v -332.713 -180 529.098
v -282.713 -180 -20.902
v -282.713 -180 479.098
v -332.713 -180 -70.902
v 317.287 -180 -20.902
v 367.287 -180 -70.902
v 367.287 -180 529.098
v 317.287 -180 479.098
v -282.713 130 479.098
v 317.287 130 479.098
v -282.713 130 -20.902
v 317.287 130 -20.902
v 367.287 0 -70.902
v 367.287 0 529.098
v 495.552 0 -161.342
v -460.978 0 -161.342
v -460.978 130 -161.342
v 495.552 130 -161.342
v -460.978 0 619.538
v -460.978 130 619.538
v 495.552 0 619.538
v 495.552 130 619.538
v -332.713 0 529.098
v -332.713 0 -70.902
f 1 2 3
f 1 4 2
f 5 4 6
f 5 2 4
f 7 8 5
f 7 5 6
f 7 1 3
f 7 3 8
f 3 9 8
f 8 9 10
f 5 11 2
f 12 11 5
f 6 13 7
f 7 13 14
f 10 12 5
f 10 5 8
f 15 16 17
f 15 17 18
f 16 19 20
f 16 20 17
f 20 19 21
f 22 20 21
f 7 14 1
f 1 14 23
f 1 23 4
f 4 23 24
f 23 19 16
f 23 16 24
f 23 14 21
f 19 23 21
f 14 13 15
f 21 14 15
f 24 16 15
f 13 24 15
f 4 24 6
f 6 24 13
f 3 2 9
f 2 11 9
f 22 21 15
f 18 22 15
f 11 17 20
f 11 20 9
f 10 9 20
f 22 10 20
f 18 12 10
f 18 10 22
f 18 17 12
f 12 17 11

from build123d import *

# Parameters (mm, degrees)
SKETCH1_W           = 956.53
SKETCH1_H           = 780.88
BOSS_EXTRUDE1_DEPTH = 130
SKETCH2_W           = 600
SKETCH2_H           = 500
BOSS_EXTRUDE2_DEPTH = 180


with BuildPart() as part:
    # Sketch1 → Boss-Extrude1 (new body)
    with BuildSketch(Plane(origin=(0, 0, 0), x_dir=(1, 0, 0), z_dir=(0, 1, 0))):
        with Locations((17.286686747, -229.097590361)):
            Rectangle(SKETCH1_W, SKETCH1_H)
        Polygon((17.286686747, 20.902409639), (317.286686747, 20.902409639), (317.286686747, -229.097590361), (317.286686747, -479.097590361), (17.286686747, -479.097590361), (-282.713313253, -479.097590361), (-282.713313253, -229.097590361), (-282.713313253, 20.902409639), align=None, mode=Mode.SUBTRACT)
    extrude(amount=BOSS_EXTRUDE1_DEPTH)

    # Sketch2 → Boss-Extrude2 (add)
    with BuildSketch(Plane.XZ):
        Polygon((367.286686747, -70.902409639), (367.286686747, -20.902409639), (367.286686747, 479.097590361), (367.286686747, 529.097590361), (-332.713313253, 529.097590361), (-332.713313253, 479.097590361), (-332.713313253, -70.902409639), (-282.713313253, -70.902409639), align=None)
        with Locations((17.286686747, 229.097590361)):
            Rectangle(SKETCH2_W, SKETCH2_H, mode=Mode.SUBTRACT)
    extrude(amount=BOSS_EXTRUDE2_DEPTH)


solid = part.part
